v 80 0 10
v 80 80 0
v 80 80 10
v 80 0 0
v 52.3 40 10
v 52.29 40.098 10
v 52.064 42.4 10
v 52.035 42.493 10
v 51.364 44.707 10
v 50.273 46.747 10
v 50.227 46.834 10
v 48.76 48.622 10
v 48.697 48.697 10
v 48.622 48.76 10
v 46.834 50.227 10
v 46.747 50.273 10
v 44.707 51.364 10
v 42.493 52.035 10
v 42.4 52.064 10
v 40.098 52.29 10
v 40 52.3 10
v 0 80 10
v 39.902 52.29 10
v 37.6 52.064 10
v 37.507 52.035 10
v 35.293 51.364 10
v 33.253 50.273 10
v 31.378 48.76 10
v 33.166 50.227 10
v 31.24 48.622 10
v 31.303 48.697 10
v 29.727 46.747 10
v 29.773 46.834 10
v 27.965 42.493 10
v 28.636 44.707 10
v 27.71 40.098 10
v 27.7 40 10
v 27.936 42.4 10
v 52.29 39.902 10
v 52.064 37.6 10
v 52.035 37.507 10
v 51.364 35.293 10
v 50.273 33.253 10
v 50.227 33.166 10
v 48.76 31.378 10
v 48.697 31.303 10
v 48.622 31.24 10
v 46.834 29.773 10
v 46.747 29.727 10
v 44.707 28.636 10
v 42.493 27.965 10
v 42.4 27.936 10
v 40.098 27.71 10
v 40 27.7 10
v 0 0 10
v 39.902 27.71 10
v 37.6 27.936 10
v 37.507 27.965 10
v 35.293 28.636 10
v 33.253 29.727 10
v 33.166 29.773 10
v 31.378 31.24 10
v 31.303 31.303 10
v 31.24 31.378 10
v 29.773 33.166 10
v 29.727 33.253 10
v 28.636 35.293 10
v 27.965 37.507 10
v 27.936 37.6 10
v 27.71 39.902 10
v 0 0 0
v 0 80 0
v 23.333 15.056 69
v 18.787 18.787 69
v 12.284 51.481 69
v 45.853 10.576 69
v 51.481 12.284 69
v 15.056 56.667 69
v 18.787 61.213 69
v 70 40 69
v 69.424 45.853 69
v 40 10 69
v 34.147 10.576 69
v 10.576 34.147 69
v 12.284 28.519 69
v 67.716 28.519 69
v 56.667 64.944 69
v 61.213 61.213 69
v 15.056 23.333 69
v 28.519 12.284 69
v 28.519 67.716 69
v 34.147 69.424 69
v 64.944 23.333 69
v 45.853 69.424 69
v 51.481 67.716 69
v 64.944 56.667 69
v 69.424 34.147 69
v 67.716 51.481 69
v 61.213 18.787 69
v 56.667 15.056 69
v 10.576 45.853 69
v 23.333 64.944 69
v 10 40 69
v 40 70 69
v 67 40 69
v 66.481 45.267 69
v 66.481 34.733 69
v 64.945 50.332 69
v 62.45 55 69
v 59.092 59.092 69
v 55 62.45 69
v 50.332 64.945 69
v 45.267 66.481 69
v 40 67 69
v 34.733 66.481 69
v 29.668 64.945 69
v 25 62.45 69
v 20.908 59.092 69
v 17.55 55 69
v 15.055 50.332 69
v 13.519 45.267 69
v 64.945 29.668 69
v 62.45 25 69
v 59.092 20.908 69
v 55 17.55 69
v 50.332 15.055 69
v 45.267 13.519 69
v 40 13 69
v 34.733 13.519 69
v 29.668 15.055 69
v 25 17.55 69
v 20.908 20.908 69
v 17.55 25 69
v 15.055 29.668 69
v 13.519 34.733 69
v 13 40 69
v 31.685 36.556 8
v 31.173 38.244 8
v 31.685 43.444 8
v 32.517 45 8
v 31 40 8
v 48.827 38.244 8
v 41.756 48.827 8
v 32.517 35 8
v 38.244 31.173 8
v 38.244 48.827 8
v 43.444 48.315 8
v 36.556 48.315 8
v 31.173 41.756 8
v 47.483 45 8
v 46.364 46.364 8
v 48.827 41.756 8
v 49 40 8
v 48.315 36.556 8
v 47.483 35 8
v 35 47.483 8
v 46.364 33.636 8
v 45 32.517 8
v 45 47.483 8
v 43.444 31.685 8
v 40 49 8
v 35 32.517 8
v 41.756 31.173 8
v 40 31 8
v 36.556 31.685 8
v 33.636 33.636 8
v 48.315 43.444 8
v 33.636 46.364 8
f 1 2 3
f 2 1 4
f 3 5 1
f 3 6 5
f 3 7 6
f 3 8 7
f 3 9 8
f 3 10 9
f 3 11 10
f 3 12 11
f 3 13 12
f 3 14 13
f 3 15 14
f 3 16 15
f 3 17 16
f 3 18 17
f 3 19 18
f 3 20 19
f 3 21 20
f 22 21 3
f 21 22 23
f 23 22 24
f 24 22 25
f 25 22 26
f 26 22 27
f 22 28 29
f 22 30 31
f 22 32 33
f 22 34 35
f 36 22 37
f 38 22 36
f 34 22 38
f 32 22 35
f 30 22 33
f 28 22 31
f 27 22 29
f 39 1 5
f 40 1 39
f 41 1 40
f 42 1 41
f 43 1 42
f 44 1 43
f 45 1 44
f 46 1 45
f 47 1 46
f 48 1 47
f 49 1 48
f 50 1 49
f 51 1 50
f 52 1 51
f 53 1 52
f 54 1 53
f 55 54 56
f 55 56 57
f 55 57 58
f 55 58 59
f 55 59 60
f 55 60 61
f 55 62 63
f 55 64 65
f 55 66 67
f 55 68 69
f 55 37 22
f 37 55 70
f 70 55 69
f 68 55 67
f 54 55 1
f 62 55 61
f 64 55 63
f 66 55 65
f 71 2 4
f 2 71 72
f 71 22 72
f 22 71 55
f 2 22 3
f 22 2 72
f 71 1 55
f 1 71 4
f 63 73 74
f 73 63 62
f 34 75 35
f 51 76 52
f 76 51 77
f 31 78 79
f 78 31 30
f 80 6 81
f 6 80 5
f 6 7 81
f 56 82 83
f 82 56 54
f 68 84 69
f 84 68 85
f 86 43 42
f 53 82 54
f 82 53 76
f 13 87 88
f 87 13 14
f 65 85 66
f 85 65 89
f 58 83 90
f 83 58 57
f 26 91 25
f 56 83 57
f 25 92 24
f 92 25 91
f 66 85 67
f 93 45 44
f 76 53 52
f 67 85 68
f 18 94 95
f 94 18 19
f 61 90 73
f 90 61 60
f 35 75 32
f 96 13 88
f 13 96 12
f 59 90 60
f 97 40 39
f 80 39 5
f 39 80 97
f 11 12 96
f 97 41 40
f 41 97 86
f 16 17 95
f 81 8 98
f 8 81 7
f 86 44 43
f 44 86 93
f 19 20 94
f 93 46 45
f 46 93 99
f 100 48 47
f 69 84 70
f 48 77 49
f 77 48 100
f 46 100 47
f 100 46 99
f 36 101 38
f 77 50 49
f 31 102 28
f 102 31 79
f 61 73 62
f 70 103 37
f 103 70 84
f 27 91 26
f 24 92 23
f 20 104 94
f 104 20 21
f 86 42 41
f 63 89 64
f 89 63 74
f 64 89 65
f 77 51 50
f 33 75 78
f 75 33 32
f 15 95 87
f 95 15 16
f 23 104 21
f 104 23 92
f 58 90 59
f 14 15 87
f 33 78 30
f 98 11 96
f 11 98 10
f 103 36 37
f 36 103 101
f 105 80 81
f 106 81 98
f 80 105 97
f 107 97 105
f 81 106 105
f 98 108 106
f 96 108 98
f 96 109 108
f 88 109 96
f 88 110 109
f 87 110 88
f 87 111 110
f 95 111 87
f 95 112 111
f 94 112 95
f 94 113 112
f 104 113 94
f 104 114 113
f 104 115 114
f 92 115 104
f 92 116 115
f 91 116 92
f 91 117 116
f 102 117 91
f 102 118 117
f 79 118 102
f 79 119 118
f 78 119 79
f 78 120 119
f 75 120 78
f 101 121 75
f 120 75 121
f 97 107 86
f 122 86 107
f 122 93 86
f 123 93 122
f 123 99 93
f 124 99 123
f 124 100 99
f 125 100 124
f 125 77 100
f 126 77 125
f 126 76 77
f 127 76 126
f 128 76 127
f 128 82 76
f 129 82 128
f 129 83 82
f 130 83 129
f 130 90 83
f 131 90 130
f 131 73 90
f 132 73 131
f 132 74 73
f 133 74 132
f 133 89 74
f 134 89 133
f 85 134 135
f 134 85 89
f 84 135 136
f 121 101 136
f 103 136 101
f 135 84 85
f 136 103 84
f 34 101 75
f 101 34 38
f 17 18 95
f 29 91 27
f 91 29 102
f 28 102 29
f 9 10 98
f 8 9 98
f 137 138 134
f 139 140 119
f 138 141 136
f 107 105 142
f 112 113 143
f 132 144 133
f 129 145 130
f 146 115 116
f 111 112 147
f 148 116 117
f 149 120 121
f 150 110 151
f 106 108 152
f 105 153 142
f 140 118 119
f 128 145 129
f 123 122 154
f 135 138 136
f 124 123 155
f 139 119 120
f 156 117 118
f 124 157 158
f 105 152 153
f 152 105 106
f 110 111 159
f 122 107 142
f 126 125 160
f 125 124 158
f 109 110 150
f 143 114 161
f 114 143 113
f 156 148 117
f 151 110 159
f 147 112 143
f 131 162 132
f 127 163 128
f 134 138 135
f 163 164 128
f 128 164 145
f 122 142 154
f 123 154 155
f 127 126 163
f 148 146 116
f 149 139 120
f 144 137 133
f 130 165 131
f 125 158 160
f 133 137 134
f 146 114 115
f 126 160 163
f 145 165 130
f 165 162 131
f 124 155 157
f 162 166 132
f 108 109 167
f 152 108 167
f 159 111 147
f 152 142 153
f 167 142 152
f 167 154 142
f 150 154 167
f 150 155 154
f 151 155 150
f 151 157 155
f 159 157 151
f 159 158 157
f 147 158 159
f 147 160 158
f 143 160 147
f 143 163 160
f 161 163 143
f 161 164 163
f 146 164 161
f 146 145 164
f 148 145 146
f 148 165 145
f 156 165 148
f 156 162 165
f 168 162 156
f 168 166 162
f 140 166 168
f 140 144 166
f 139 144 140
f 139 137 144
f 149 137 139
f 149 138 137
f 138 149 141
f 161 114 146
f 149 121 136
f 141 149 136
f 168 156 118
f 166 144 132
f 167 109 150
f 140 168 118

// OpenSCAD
$fn = 32;

// ----------------------------------------------------------------------
// Hopper: funnel with square flange
// ----------------------------------------------------------------------

// --- parameters (mm) ---
fl = 80;                  // flange side, X and Y
fl_t = 10;                // flange thickness
cone_h = 60;              // cone height above the flange
top_d = 60;               // cone mouth diameter
bot_d = 24;               // cone spout diameter
wall = 3;                 // cone wall thickness

bore_d = bot_d - 2 * wall;  // spout bore diameter
total_h = fl_t + cone_h - 1;  // overall height

difference() {
  union() {
    cube([fl, fl, fl_t]);
    translate([fl / 2, fl / 2, fl_t - 1])
      cylinder(h = cone_h, d1 = bot_d, d2 = top_d);
  }
  translate([fl / 2, fl / 2, fl_t - 2])
    cylinder(h = cone_h + 1, d1 = bore_d, d2 = top_d - 2 * wall);
}
